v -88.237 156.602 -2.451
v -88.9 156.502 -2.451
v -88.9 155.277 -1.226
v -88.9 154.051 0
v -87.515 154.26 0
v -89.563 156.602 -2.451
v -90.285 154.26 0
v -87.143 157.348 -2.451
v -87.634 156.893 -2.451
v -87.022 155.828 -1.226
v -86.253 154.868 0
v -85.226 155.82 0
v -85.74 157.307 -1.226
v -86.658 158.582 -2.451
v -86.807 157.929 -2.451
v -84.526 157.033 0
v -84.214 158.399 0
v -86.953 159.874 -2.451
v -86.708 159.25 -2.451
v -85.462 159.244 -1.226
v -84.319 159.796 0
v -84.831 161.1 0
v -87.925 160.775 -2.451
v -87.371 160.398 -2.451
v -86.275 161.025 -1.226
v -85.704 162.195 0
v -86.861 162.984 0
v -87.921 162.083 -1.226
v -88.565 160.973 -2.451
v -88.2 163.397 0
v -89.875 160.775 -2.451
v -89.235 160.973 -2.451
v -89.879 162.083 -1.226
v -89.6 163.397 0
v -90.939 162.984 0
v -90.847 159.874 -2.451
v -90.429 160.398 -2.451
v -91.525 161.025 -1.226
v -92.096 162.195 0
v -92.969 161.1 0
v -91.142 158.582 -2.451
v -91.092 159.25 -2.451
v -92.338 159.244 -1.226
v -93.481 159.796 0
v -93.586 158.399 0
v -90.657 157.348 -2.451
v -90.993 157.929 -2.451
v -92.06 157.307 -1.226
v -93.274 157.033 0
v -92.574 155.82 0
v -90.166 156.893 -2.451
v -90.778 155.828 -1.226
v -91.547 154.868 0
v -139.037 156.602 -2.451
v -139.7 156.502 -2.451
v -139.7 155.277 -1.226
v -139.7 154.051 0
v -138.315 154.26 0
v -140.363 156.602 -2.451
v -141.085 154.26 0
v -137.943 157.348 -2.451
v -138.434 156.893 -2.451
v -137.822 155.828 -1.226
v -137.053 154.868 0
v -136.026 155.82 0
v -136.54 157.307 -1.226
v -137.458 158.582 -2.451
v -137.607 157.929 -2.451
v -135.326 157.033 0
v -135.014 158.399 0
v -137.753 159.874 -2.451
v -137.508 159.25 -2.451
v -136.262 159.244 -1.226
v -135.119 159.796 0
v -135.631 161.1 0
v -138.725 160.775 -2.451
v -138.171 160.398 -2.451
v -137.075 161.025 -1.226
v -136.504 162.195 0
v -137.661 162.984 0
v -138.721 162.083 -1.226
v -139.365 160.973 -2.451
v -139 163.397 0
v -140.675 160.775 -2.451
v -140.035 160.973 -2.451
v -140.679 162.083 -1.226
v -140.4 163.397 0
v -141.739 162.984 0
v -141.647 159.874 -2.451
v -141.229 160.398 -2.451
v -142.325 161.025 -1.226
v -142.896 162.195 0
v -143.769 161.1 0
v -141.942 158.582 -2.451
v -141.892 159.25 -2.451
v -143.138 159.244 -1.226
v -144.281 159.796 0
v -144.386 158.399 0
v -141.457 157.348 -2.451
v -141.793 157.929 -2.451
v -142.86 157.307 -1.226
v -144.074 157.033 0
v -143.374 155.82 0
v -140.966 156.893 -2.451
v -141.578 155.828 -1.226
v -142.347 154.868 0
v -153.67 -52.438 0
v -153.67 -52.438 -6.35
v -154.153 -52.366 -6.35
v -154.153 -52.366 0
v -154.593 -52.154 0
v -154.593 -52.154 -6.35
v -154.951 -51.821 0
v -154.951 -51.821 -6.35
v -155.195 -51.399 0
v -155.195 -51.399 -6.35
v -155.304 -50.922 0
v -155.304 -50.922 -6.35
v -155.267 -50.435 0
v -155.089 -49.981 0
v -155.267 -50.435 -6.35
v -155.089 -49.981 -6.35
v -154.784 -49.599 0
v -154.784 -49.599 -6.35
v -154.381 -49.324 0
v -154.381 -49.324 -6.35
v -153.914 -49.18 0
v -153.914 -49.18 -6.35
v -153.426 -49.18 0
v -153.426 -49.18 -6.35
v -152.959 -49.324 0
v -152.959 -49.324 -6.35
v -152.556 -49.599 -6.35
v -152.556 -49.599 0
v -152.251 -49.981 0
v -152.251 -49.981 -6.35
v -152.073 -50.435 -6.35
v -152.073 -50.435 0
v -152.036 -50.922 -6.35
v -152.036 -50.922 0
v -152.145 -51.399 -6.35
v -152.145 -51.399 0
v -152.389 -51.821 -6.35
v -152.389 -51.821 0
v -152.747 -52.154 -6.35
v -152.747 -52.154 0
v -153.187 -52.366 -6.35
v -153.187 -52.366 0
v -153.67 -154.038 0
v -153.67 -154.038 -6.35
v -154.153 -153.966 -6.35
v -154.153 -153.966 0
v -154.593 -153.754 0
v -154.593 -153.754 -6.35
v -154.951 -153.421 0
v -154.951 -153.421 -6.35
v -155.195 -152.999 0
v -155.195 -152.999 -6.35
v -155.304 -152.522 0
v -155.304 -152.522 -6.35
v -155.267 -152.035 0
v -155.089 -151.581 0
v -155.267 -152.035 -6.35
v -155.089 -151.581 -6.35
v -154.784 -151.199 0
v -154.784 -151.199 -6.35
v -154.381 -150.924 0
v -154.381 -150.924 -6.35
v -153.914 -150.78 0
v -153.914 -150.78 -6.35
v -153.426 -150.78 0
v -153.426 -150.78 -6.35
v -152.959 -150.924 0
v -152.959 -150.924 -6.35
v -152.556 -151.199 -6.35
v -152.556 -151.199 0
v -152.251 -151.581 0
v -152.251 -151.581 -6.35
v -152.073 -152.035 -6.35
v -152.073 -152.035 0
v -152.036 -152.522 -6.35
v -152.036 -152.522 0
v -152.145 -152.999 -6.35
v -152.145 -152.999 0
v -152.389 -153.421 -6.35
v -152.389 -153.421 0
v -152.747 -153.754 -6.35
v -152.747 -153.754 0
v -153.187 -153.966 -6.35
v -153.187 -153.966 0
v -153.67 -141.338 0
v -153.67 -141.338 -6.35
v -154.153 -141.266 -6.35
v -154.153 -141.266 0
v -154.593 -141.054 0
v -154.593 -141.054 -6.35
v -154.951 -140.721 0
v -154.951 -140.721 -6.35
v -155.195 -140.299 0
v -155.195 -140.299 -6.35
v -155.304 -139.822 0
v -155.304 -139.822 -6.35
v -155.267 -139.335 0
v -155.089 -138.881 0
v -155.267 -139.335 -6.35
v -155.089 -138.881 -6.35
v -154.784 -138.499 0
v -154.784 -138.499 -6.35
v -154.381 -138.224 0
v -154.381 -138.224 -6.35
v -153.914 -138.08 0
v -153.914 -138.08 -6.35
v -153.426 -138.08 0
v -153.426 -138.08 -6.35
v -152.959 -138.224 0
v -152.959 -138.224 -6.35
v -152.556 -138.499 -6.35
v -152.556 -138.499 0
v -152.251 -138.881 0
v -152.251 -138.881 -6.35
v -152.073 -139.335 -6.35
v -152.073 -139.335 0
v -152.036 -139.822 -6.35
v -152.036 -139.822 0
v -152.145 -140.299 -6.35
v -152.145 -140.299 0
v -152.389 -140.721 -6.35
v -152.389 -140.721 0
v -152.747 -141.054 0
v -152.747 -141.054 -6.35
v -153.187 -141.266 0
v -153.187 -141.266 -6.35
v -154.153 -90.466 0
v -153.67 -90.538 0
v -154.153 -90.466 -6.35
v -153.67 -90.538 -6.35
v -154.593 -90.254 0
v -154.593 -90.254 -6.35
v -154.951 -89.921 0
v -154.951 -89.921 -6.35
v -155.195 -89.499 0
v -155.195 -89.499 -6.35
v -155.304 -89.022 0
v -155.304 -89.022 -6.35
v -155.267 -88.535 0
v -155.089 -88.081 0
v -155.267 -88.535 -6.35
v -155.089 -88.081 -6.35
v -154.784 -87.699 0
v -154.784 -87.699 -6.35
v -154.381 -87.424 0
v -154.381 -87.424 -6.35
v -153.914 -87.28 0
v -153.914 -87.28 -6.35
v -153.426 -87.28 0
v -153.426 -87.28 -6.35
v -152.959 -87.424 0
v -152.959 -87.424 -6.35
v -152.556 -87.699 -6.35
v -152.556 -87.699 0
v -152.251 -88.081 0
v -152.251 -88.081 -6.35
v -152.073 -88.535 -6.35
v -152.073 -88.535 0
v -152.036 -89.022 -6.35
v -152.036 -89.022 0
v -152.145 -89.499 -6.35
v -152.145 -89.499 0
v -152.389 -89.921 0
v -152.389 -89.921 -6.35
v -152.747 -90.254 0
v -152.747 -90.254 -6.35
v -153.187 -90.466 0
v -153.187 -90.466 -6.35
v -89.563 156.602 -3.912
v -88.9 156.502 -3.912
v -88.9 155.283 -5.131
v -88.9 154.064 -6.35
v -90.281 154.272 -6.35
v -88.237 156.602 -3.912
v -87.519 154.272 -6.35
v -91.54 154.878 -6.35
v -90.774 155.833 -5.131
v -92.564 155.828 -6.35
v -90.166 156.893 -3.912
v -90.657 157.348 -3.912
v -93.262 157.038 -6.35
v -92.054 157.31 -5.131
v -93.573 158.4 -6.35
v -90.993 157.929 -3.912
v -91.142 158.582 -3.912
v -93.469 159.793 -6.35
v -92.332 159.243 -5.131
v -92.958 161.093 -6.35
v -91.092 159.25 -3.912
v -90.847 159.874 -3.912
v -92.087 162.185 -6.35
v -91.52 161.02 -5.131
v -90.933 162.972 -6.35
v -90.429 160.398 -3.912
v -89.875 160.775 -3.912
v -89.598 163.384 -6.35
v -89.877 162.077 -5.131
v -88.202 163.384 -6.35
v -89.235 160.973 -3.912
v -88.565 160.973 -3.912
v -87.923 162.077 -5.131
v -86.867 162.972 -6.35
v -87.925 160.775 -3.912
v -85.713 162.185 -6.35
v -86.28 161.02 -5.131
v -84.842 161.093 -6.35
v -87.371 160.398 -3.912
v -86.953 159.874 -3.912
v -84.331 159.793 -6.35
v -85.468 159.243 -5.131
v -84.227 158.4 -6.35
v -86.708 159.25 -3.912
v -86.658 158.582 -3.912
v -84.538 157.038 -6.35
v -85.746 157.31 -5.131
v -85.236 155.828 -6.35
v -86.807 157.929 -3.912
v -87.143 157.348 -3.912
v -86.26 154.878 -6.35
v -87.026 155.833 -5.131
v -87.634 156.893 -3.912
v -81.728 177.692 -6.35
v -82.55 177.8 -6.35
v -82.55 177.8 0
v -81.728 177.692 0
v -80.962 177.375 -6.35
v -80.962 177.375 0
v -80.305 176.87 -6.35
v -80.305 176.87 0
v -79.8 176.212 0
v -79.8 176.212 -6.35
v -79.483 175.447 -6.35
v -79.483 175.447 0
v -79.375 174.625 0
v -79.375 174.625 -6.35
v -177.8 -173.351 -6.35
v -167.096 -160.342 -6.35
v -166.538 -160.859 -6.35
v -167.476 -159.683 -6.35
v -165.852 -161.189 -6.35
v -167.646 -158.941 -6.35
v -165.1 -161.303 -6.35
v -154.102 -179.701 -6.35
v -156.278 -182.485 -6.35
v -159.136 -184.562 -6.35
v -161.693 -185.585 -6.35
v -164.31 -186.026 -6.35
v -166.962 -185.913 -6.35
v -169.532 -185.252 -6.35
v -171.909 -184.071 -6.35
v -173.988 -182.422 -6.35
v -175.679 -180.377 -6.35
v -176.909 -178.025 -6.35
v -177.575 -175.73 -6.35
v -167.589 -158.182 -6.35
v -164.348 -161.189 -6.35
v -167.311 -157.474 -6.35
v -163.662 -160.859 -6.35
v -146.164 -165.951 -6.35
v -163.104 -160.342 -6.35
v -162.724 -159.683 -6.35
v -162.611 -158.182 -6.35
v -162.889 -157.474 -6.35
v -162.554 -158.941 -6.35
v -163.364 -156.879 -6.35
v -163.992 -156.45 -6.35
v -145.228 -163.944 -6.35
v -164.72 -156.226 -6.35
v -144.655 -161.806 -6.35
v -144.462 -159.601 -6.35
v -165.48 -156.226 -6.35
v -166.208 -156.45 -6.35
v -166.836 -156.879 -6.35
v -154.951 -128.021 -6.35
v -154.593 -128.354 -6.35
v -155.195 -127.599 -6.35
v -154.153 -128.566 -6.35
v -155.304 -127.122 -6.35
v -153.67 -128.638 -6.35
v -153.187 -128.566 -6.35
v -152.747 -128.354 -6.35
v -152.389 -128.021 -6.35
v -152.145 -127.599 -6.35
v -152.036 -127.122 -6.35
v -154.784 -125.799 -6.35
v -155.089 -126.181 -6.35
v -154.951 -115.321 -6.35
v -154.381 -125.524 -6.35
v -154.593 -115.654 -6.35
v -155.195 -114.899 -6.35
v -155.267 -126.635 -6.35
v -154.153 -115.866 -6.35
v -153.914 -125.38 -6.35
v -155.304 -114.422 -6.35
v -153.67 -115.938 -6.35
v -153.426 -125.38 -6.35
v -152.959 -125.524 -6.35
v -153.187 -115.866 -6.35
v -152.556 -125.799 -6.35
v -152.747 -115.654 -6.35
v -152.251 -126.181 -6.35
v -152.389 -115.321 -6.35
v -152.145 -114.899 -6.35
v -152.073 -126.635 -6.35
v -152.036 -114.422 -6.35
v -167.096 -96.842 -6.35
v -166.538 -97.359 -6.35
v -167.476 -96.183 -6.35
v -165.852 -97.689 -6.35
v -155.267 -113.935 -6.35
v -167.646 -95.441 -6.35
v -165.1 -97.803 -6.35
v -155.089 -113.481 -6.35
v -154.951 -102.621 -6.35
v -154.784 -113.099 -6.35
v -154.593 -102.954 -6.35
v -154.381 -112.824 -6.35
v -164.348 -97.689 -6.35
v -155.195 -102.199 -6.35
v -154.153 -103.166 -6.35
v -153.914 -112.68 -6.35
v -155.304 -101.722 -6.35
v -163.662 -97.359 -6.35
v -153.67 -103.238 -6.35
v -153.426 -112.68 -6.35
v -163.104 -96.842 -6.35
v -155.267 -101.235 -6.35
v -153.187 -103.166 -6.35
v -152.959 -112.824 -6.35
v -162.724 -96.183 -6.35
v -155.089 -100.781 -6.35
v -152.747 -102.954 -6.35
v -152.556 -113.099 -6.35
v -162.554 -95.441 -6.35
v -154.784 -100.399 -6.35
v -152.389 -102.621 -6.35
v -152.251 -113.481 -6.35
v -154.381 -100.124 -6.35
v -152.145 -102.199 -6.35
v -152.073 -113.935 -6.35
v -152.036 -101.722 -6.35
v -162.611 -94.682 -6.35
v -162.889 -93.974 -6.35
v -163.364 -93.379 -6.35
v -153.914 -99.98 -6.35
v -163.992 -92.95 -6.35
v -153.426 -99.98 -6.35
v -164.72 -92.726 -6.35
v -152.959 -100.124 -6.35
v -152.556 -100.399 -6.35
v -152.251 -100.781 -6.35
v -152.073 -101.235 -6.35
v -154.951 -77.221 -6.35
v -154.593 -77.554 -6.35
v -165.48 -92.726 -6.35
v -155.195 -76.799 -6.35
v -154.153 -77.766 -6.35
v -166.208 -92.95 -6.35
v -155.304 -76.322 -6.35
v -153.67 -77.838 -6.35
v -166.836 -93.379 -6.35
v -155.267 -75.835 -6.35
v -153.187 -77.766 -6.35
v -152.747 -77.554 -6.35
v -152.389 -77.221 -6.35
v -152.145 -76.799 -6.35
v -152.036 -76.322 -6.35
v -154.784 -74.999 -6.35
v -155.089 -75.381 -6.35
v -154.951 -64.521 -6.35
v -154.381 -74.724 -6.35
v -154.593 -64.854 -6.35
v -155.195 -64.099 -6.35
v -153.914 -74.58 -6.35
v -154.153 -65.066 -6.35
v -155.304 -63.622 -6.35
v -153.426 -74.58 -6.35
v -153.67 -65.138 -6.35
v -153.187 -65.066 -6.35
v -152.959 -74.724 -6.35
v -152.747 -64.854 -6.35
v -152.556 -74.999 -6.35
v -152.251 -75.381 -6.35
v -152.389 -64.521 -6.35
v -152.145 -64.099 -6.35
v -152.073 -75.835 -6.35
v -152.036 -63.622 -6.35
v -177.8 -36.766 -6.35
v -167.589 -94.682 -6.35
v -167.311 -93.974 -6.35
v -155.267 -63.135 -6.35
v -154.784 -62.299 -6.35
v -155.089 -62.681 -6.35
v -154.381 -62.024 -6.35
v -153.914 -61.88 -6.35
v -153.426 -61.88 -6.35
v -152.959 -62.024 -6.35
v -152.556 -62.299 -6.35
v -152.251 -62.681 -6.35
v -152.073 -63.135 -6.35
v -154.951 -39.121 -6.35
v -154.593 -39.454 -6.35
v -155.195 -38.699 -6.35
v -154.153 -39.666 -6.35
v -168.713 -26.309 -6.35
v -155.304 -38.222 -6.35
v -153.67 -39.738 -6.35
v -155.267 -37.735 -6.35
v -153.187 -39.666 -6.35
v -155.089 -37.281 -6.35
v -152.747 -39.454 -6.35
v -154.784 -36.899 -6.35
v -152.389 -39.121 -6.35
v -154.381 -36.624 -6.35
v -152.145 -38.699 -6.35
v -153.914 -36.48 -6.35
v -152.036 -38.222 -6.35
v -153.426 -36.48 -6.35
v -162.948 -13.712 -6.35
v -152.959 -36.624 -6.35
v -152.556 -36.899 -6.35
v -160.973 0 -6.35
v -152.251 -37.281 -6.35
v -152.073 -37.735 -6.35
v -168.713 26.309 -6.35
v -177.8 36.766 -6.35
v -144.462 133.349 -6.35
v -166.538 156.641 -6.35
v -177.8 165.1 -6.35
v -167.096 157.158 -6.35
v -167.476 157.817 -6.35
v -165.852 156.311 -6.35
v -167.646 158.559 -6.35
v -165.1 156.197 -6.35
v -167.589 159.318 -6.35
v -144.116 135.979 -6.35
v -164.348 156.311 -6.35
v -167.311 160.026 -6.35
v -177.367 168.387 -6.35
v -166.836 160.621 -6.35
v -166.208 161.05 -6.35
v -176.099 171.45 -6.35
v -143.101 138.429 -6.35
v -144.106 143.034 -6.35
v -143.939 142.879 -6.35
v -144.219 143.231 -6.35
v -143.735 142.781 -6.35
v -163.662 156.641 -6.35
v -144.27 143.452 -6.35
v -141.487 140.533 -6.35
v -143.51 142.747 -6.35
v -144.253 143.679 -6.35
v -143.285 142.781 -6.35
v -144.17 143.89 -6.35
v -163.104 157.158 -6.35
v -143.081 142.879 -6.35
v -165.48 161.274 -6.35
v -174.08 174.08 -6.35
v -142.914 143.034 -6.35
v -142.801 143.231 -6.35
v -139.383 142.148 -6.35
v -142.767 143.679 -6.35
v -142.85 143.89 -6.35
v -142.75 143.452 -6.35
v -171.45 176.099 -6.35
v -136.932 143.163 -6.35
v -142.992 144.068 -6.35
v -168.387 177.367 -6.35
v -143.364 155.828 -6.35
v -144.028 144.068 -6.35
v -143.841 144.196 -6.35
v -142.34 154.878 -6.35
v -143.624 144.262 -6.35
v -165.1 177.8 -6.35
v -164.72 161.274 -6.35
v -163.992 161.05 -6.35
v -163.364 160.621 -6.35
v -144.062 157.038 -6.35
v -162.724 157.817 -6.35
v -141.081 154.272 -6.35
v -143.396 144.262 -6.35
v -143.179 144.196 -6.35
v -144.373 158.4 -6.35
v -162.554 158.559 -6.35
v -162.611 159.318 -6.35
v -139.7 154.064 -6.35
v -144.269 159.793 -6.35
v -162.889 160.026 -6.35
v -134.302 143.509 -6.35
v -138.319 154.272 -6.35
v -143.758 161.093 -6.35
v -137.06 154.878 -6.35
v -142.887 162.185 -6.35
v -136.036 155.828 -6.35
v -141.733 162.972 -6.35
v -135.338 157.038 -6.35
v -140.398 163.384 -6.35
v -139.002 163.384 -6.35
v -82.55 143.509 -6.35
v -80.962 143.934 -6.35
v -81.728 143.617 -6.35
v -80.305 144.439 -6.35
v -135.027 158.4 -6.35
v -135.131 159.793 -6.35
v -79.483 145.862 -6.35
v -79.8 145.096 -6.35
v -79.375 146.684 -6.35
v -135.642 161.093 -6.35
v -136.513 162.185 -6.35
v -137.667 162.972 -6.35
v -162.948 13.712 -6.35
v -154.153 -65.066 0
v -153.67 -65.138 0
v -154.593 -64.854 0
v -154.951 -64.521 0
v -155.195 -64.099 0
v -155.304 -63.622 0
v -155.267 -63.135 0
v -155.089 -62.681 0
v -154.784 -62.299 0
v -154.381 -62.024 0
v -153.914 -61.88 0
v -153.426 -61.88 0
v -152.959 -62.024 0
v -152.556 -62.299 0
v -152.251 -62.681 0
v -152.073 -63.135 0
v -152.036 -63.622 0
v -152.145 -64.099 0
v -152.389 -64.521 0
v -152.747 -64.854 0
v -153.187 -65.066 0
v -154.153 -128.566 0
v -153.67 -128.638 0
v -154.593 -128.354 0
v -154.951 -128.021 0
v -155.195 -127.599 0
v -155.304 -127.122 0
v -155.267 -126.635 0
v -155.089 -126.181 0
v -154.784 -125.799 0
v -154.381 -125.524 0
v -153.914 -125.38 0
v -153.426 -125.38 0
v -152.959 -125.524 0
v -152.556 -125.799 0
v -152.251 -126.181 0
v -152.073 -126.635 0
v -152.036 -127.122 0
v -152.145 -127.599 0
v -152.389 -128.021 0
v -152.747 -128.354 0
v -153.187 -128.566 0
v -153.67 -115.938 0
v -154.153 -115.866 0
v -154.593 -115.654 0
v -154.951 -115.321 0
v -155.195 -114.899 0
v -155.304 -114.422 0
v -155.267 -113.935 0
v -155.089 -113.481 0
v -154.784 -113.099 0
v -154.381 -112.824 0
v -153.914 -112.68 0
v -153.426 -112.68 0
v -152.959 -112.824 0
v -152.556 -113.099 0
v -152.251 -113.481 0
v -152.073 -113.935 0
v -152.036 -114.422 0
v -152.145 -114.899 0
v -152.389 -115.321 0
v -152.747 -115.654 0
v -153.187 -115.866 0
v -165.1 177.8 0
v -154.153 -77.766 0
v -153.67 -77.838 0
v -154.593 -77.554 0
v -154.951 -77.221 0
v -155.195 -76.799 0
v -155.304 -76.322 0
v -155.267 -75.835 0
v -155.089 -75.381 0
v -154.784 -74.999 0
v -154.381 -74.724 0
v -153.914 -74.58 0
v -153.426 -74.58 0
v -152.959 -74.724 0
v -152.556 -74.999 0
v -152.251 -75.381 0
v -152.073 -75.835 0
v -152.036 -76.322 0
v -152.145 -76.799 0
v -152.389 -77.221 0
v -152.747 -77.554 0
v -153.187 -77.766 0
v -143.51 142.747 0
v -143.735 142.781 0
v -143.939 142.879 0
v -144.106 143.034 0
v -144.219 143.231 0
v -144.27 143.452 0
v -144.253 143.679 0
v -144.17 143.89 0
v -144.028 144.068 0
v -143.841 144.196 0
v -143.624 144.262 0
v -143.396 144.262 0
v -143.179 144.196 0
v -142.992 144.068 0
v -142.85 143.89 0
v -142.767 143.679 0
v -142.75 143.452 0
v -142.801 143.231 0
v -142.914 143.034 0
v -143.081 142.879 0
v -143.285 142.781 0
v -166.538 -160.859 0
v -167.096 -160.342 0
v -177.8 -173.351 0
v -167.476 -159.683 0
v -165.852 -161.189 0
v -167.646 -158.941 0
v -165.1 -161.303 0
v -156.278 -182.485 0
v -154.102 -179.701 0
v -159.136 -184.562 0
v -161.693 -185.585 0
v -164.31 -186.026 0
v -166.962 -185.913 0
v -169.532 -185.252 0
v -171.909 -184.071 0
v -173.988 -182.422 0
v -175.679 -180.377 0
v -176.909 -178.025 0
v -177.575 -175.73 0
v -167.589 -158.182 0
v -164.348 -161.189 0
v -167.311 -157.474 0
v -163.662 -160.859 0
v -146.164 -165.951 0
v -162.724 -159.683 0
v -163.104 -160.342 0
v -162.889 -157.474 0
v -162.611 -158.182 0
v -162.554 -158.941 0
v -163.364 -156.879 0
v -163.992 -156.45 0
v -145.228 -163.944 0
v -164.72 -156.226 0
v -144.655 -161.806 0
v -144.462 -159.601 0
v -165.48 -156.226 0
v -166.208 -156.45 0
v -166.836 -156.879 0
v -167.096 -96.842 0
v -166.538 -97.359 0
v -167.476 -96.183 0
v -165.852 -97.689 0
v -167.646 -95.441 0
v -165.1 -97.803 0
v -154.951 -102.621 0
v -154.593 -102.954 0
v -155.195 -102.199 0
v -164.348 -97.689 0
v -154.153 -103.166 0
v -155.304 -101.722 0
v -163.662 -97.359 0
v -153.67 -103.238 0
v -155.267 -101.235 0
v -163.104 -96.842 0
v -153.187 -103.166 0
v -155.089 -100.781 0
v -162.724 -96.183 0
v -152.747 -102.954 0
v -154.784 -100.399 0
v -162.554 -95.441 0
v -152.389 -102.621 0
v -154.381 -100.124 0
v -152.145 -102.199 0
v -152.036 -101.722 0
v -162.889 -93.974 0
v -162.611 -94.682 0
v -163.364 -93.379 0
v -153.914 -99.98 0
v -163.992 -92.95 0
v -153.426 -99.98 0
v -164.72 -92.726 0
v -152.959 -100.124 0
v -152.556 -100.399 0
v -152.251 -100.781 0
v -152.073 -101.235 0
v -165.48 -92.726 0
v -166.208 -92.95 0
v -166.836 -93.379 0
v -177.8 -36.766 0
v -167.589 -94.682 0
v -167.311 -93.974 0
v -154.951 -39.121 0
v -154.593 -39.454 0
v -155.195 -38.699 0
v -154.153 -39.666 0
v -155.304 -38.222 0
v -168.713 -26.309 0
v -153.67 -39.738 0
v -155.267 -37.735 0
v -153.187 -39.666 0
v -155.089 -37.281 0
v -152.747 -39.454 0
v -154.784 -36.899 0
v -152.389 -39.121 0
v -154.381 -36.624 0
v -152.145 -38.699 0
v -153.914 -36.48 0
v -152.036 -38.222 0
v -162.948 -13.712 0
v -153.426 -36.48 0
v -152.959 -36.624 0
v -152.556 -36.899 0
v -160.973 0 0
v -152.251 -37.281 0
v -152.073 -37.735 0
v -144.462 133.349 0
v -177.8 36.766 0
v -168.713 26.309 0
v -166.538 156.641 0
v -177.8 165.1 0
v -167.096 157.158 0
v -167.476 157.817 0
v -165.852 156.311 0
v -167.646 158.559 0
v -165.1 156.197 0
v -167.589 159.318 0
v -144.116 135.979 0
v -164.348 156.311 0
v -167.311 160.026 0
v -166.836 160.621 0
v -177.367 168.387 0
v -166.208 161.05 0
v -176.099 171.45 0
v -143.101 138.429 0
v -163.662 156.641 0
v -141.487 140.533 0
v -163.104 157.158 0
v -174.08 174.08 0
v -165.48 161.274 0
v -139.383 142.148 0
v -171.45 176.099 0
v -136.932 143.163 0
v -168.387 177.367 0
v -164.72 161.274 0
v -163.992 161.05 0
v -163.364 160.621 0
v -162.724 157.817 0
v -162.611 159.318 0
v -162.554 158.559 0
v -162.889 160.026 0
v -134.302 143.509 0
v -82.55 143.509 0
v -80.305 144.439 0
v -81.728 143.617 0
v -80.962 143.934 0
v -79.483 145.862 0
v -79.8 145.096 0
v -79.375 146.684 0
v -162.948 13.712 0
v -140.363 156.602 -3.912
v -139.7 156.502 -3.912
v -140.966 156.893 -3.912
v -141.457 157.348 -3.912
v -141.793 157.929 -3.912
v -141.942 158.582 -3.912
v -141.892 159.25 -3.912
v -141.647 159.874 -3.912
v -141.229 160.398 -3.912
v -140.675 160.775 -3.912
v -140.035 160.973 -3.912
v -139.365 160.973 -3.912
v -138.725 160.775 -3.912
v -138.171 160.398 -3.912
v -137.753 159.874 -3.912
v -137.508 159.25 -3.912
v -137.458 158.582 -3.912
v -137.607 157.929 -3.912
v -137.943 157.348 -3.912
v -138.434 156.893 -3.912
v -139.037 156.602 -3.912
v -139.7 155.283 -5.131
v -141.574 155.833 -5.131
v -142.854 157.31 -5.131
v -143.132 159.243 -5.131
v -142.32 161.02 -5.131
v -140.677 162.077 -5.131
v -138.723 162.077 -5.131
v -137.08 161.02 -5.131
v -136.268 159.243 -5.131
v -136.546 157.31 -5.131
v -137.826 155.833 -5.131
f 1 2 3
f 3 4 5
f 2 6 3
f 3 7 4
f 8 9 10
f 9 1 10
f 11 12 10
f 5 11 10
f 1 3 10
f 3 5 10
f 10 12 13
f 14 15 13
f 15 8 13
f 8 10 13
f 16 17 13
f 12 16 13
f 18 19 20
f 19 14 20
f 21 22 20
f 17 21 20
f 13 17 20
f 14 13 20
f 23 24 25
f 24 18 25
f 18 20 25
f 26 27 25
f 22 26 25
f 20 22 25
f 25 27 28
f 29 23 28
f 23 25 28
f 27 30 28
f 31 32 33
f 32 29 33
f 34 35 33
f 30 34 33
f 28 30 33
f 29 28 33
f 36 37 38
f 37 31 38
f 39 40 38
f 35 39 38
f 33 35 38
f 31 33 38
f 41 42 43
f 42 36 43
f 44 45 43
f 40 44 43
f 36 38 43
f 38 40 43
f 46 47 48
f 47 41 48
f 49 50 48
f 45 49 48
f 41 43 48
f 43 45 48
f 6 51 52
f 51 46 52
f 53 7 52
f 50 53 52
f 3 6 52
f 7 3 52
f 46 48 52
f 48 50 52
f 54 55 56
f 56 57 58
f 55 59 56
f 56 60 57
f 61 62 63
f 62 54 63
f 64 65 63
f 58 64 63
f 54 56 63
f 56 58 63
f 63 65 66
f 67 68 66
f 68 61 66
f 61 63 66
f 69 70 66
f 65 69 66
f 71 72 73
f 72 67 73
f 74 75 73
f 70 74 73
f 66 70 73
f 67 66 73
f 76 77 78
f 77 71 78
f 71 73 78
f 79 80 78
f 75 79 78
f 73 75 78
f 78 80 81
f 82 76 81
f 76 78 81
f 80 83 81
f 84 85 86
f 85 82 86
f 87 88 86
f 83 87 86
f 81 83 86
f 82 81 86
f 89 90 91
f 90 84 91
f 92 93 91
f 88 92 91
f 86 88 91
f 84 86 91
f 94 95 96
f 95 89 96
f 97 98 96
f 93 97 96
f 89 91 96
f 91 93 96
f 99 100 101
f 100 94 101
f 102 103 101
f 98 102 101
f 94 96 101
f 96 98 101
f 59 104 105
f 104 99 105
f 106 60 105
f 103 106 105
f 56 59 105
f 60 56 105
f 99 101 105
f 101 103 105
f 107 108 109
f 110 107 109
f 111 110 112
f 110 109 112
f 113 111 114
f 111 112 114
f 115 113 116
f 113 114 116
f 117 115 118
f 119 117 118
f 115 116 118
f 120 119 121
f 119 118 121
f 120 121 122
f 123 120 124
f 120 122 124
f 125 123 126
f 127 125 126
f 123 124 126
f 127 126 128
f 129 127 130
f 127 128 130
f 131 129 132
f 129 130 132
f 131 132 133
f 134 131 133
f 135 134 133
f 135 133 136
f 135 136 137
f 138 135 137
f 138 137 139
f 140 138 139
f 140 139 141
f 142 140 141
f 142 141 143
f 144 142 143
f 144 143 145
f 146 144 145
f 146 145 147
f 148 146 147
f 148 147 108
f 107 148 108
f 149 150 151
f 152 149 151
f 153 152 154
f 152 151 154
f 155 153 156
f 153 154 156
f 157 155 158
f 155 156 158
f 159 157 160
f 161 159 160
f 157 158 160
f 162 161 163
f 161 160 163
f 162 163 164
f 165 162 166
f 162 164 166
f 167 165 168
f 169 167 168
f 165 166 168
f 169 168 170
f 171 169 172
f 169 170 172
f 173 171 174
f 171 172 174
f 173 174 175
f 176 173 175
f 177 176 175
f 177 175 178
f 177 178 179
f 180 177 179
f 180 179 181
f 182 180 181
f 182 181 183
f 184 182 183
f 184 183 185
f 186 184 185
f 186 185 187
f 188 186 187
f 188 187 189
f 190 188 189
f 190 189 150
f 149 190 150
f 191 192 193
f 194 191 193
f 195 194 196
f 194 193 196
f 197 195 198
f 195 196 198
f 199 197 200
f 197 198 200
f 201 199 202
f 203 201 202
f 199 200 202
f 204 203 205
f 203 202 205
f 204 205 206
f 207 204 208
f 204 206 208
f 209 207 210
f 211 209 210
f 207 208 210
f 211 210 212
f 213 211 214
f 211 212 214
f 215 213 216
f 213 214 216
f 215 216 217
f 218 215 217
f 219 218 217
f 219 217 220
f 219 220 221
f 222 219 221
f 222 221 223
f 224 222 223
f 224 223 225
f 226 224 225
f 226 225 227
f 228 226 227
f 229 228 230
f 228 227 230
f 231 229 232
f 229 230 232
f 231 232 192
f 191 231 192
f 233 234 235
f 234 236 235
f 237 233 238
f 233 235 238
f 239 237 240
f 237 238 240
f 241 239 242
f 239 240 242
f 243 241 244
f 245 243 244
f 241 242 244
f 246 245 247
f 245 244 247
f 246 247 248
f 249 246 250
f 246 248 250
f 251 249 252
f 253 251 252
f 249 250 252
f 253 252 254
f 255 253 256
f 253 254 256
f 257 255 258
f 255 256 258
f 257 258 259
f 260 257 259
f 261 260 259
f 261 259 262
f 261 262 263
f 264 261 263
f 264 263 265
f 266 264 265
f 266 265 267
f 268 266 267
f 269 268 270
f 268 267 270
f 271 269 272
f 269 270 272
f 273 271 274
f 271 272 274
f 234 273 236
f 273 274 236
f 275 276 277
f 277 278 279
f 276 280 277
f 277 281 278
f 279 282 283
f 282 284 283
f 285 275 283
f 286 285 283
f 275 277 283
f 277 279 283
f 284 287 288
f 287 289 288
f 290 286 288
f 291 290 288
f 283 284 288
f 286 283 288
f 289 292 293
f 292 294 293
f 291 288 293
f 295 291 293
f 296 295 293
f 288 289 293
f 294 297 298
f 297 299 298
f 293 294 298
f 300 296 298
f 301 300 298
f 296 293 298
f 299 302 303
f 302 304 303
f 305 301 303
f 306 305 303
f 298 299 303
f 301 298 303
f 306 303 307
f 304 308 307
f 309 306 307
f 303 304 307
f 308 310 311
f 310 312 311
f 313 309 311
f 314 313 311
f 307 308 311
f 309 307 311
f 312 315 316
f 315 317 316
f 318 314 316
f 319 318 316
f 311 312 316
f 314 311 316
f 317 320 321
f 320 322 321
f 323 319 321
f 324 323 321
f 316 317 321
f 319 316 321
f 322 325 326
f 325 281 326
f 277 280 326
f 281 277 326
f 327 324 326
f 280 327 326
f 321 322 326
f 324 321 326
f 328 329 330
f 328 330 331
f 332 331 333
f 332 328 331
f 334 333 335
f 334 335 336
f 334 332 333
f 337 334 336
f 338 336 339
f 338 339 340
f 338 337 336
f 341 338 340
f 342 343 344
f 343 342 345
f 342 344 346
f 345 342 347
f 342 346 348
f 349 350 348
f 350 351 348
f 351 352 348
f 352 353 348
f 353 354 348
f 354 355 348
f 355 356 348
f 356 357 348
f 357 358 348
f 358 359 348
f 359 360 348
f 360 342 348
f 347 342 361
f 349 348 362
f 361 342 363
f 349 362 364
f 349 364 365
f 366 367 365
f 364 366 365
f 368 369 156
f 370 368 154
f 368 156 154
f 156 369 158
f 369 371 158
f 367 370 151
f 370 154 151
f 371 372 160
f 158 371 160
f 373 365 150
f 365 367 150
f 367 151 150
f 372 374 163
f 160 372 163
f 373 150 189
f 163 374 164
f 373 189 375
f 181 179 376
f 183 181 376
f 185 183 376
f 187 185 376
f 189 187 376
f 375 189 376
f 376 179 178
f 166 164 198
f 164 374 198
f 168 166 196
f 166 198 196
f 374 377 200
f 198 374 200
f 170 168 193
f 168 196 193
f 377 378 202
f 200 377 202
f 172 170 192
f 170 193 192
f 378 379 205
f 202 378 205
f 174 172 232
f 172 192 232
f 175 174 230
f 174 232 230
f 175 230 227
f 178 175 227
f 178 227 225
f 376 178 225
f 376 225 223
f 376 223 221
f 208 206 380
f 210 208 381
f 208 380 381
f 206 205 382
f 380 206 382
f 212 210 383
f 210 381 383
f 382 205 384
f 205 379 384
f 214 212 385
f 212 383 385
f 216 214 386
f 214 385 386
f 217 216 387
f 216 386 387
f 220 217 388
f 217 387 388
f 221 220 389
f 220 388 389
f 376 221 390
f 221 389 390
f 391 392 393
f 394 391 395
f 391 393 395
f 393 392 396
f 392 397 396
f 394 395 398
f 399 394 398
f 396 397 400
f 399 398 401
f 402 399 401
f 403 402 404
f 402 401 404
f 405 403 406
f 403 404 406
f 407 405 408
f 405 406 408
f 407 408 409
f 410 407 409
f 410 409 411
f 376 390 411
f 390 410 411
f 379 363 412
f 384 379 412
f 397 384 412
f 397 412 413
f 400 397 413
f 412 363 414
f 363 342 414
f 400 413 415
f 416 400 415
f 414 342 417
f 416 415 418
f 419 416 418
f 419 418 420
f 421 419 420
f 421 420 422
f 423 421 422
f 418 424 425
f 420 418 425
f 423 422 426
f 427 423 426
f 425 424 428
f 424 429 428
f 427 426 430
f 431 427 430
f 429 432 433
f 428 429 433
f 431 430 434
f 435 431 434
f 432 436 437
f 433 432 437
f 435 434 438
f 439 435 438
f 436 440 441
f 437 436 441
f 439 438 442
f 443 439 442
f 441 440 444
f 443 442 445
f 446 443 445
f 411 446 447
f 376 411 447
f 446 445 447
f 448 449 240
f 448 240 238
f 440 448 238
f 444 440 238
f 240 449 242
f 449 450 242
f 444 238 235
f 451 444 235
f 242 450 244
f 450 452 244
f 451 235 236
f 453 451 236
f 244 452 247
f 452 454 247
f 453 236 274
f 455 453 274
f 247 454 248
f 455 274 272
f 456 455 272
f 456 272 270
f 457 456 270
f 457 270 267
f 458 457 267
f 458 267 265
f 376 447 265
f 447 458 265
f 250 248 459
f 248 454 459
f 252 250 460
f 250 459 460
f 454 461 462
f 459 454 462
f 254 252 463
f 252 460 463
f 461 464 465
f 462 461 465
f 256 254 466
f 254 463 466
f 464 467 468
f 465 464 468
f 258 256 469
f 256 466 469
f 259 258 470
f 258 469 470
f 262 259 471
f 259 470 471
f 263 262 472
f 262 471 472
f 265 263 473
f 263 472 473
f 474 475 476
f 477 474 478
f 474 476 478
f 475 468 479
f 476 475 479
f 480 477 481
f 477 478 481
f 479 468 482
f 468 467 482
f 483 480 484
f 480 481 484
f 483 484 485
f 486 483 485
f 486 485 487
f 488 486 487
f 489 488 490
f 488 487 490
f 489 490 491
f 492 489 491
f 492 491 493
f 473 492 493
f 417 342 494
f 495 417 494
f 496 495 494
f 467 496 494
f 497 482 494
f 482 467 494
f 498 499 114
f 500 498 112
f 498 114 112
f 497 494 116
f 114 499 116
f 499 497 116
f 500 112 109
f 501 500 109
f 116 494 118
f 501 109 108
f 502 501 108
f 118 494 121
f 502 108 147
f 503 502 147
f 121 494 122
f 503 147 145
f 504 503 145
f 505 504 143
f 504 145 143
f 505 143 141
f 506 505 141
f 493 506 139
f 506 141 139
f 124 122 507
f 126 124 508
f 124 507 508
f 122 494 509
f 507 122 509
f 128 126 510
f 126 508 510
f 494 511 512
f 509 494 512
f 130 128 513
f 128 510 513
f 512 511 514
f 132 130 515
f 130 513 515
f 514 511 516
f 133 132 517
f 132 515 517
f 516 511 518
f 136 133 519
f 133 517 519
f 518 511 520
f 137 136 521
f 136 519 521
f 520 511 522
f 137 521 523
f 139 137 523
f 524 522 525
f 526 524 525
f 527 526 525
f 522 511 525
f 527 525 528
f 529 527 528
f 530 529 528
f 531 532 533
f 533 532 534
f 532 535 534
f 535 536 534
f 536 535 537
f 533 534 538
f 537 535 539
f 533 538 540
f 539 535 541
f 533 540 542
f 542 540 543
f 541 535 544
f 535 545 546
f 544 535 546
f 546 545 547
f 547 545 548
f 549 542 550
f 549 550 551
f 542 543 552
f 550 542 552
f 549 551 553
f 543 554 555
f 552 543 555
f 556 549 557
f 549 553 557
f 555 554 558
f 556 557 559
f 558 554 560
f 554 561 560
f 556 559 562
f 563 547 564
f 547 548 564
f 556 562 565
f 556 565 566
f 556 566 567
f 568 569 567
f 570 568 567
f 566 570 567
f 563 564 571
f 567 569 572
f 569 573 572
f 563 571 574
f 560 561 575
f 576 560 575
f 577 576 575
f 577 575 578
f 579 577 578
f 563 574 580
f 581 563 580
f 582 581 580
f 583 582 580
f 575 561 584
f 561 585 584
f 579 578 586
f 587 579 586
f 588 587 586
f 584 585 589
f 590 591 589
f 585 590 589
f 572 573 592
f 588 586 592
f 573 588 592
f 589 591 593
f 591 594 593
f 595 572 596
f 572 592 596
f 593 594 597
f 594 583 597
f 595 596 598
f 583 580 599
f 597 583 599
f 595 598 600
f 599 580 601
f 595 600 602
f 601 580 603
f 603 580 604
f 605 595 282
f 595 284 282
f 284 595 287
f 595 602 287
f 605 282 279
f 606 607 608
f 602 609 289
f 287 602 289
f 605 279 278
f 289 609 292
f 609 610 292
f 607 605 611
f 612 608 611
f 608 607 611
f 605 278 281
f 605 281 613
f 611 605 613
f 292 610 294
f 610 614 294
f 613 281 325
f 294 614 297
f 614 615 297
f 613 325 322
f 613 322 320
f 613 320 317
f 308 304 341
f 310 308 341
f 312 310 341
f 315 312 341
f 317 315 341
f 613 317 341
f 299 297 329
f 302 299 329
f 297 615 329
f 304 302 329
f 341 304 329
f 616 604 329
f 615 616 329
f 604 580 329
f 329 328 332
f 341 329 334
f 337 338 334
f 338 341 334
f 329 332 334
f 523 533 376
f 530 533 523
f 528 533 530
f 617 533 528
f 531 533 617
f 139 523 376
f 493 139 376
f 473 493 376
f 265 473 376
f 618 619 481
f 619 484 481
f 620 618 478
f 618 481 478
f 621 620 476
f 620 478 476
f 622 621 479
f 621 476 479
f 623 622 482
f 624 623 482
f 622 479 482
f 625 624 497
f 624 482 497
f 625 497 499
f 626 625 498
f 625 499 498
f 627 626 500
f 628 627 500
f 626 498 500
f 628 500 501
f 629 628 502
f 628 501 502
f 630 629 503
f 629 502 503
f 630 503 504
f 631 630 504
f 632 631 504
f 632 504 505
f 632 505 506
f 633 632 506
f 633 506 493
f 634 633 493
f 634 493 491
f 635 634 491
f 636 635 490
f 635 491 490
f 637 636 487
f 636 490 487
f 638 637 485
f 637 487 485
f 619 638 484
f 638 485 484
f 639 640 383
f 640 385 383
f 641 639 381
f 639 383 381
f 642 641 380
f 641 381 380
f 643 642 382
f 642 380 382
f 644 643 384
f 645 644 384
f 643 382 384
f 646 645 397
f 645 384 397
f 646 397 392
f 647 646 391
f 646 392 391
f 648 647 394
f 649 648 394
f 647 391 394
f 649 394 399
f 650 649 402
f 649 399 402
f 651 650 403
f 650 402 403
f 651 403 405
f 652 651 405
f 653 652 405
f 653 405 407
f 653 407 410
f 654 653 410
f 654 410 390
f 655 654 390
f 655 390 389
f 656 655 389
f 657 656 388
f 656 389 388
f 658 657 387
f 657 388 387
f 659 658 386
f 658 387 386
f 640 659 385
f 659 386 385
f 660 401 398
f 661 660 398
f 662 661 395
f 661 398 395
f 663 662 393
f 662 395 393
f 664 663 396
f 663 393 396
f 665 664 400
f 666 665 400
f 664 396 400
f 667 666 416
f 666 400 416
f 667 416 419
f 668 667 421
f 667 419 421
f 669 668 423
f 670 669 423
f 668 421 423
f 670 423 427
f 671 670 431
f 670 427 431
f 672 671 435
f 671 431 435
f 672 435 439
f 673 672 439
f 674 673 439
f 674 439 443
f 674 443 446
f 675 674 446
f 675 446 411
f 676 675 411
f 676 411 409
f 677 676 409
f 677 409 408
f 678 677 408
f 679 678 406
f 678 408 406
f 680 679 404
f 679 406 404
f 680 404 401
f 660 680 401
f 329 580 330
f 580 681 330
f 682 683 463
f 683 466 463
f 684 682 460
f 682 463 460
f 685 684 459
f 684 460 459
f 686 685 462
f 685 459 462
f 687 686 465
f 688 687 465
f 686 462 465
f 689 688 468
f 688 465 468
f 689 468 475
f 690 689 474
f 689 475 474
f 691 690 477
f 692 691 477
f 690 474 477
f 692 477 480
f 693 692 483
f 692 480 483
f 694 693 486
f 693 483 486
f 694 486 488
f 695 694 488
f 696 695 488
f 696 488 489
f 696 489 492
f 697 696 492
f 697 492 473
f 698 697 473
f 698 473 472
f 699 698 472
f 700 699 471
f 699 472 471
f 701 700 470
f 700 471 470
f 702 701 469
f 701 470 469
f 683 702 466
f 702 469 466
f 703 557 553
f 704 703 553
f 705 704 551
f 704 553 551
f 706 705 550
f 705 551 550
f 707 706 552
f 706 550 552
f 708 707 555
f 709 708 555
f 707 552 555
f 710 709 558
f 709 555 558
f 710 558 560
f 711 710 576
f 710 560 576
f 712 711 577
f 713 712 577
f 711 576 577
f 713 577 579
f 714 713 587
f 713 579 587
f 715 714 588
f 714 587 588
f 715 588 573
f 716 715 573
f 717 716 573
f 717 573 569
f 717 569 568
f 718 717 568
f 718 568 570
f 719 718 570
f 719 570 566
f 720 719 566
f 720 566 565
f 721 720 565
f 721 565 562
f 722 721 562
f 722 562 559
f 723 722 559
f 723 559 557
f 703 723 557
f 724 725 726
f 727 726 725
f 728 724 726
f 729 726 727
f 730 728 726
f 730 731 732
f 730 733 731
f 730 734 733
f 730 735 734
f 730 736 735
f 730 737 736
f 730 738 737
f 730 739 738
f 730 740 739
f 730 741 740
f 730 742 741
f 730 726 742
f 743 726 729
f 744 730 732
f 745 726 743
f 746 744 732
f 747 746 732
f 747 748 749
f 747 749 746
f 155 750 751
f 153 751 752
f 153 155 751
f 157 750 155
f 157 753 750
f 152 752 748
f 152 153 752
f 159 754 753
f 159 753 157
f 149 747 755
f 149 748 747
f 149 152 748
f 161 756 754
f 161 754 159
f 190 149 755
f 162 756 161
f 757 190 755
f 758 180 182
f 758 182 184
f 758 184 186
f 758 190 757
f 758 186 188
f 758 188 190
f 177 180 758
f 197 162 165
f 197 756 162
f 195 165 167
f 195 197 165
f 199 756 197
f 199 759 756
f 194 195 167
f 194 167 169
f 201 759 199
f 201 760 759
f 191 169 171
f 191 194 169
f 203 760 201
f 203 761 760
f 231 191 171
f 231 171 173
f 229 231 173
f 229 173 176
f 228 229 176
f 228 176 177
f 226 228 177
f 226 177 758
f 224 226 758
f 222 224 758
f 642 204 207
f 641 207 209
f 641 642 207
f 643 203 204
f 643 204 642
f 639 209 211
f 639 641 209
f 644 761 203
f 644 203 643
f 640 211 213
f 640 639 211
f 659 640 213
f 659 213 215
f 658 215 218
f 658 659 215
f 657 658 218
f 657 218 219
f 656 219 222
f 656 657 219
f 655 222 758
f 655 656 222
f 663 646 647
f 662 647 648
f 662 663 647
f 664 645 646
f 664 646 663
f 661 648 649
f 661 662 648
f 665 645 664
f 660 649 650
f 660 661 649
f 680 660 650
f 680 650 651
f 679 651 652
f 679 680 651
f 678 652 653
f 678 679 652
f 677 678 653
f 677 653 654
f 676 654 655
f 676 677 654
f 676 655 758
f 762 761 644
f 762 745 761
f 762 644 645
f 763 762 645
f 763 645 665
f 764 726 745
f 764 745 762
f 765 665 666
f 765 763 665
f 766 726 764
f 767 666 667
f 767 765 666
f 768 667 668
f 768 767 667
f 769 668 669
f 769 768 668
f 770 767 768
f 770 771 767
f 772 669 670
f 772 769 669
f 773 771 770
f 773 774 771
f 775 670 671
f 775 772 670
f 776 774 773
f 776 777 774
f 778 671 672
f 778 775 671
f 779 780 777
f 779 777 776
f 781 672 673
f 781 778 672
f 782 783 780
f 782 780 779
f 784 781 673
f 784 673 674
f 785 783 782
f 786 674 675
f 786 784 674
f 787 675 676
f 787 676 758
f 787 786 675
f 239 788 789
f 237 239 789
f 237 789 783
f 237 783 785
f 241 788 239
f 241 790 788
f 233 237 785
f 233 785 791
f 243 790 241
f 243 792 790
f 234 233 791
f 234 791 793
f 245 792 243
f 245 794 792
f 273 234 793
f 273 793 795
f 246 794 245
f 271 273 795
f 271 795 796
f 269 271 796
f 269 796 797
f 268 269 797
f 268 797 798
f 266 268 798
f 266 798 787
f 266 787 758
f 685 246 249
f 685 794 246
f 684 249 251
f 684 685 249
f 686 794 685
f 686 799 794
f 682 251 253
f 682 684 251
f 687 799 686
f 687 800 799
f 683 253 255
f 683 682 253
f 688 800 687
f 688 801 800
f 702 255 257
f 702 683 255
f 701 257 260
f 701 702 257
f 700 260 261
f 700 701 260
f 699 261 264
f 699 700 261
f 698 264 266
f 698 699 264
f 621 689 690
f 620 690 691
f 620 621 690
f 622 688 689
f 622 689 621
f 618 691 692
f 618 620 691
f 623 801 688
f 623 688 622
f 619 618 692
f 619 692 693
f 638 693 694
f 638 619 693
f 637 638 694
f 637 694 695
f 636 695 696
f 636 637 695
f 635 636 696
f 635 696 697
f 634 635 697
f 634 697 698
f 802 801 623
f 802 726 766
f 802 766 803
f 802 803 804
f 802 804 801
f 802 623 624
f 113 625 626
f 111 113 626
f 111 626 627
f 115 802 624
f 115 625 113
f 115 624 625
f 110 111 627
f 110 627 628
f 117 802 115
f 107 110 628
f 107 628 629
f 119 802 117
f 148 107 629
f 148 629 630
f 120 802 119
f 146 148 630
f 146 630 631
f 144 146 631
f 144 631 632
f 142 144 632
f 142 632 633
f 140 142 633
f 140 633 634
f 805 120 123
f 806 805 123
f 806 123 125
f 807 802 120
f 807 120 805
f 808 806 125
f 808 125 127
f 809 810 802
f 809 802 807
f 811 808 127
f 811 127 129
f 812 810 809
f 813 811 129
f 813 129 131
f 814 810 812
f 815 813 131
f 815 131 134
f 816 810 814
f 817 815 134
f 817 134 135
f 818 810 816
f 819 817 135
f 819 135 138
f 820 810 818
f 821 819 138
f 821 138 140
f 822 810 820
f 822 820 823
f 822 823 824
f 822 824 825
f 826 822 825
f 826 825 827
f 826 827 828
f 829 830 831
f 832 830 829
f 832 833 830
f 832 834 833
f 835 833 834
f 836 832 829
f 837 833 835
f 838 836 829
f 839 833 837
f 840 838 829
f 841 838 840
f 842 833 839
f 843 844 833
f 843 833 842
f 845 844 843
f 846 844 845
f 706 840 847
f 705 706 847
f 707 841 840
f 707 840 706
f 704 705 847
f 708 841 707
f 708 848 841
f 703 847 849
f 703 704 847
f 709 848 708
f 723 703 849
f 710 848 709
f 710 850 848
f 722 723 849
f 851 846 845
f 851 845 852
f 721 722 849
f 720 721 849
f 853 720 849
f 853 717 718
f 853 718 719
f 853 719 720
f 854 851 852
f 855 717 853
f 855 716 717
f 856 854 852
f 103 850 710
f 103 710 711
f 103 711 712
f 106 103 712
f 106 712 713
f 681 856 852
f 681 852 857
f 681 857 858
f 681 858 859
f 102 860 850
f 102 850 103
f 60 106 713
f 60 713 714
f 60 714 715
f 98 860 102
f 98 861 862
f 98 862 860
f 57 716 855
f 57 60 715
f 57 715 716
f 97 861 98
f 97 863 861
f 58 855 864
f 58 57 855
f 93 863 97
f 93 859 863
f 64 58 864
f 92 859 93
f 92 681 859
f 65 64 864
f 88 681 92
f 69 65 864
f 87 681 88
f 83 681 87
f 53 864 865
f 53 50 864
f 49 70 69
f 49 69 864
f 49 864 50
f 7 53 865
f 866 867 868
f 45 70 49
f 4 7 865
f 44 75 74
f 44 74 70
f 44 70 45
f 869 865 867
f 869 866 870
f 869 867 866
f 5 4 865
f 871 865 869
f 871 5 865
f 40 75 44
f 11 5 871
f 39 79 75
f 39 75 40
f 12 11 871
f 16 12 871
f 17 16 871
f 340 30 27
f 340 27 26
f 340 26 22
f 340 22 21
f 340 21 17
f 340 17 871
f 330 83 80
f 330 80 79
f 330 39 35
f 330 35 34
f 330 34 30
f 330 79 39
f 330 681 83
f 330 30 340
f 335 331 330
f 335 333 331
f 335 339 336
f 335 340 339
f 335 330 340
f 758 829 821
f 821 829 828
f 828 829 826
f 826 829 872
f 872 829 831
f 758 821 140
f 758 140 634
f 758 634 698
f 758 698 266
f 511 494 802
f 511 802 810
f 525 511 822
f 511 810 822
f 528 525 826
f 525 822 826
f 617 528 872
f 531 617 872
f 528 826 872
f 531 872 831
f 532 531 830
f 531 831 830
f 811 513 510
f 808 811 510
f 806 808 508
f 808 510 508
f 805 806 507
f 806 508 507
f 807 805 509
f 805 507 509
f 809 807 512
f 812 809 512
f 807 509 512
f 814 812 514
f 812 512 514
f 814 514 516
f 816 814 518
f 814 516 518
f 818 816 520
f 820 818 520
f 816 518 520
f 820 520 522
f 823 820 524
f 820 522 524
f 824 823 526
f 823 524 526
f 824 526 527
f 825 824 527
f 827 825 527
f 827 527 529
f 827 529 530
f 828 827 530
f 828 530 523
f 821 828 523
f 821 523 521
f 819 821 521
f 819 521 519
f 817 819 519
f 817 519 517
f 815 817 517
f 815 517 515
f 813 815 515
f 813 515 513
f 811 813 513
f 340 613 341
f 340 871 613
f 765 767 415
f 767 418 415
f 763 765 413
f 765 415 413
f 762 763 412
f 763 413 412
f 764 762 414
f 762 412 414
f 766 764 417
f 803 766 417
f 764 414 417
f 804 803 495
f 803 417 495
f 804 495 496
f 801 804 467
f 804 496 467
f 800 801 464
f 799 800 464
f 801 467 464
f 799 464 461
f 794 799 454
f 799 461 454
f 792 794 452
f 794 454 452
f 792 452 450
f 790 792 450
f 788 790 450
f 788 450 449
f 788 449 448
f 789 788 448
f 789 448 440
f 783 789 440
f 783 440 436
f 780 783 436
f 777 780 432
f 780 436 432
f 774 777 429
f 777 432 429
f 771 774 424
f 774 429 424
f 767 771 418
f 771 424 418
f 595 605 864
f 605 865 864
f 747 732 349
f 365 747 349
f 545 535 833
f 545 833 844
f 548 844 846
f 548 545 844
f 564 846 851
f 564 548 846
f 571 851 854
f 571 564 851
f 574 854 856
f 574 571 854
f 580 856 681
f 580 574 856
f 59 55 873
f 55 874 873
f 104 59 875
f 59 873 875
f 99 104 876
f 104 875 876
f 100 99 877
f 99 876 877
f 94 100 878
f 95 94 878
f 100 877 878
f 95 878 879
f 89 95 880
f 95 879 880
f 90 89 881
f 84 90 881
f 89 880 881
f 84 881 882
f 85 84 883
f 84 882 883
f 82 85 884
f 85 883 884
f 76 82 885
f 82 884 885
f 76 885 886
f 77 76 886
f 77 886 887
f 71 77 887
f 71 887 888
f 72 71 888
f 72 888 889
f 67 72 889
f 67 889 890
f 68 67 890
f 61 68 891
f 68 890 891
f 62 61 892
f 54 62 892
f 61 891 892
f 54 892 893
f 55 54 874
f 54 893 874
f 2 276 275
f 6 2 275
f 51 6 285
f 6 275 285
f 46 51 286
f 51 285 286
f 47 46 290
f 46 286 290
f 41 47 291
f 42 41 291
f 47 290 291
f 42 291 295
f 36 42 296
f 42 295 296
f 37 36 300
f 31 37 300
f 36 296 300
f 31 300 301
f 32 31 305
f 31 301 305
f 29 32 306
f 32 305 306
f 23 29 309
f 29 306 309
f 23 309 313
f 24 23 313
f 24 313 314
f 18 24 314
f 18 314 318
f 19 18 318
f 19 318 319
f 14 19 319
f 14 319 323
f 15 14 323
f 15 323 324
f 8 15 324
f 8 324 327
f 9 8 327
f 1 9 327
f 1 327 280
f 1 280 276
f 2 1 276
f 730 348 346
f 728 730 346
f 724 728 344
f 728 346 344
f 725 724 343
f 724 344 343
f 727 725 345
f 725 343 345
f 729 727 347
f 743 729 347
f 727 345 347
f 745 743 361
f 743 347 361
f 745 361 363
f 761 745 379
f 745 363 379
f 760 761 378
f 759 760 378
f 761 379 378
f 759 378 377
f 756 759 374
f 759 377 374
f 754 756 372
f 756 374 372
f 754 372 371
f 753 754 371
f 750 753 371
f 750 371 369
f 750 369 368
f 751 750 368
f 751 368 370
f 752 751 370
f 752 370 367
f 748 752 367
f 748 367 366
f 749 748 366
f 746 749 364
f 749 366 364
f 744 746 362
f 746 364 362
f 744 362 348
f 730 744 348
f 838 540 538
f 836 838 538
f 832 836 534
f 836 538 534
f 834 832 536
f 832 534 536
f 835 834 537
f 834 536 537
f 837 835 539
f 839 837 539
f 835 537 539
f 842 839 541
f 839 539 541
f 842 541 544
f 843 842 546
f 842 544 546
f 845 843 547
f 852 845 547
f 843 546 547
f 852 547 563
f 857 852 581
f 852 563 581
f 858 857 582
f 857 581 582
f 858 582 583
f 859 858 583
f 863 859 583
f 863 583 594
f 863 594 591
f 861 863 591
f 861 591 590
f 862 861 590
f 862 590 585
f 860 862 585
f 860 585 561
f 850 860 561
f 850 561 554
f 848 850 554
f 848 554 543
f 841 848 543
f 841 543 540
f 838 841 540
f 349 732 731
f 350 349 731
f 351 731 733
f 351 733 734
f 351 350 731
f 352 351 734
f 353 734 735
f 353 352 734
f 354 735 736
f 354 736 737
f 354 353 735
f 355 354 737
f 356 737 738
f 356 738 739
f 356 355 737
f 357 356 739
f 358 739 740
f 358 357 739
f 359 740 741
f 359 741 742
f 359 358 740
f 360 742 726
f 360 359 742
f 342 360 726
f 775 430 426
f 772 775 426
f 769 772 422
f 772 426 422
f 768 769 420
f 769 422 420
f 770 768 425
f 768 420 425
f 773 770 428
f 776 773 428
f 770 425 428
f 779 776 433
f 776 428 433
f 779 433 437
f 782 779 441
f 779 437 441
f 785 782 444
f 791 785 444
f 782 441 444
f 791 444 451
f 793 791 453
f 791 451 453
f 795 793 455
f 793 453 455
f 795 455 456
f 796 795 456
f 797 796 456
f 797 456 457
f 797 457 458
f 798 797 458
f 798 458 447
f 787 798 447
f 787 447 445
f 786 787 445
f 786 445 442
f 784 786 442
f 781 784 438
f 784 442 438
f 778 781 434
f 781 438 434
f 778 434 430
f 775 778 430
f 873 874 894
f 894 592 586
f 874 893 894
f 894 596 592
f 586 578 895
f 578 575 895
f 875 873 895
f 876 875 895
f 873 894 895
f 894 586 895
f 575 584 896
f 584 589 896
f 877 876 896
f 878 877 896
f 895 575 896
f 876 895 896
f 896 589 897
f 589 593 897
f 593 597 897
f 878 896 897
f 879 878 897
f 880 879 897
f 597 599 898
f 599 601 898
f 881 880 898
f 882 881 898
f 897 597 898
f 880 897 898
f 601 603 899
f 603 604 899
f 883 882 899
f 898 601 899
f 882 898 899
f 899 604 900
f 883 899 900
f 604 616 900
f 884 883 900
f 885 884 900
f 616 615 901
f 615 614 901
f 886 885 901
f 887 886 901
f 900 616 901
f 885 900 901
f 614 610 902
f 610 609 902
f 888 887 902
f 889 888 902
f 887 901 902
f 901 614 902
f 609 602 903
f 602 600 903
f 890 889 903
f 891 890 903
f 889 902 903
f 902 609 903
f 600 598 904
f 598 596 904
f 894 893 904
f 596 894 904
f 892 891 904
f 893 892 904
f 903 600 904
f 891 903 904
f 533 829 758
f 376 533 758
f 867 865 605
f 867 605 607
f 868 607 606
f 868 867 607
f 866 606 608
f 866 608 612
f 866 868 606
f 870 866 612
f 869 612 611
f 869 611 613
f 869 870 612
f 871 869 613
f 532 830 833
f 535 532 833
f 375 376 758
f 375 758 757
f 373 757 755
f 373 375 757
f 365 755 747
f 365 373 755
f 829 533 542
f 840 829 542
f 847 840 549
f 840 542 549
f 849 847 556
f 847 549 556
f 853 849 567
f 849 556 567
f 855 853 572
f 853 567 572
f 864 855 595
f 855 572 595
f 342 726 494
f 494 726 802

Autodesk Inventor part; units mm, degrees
ref_plane "YZ Plane" through (0, 0, 0) normal (1, 0, 0) x (0, 1, 0)
ref_plane "XZ Plane" through (0, 0, 0) normal (0, 1, 0) x (-1, 0, 0)
ref_plane "XY Plane" through (0, 0, 0) normal (0, 0, 1) x (1, 0, 0)
sketch "Sketch1" plane through (0, 0, 0) normal (0, 0, 1) x (1, 0, 0)
  line L0 (0, 251.46) -> (0, -264.16) projected
  line L1 (-361.3785, 0) -> (361.3785, 0) projected
  line L2 (177.8, -190.5) -> (-177.8, -190.5)
  line L3 (-177.8, -190.5) -> (-177.8, 177.8)
  line L4 (-177.8, 177.8) -> (177.8, 177.8)
  line L5 (177.8, 177.8) -> (177.8, -190.5)
  line L6 (143.51, -143.511) -> (-143.51, -143.511) construction
  line L7 (-143.51, -143.511) -> (-143.51, 143.509) construction
  line L8 (-143.51, 143.509) -> (143.51, 143.509) construction
  line L9 (143.51, 143.509) -> (143.51, -143.511) construction
  line L10 (-177.8, 177.8) -> (-177.8, 177.8)
  line L11 (-177.8, -190.5) -> (-177.8, 177.8)
  line L12 (177.8, 177.8) -> (177.8, 177.8)
  line L13 (177.8, -190.5) -> (177.8, 177.8)
  line L14 (-165.1, -158.75) -> (165.1, -158.75) construction
  line L15 (165.1, -158.75) -> (165.1, 158.75) construction
  line L16 (165.1, 158.75) -> (-165.1, 158.75) construction
  line L17 (-165.1, 158.75) -> (-165.1, -158.75) construction
  line L18 (144.4625, 143.509) -> (-144.4625, 143.509)
  line L19 (-144.4625, 143.509) -> (-144.4625, -190.5)
  line L20 (-144.4625, -190.5) -> (144.4625, -190.5)
  line L21 (144.4625, -190.5) -> (144.4625, 143.509)
  line L22 (144.4625, 143.509) -> (-144.4625, -190.5) construction
  line L23 (-144.4625, 143.509) -> (144.4625, -190.5) construction
  circle A0 centre (-209.55, 0) radius 48.5775
  circle A1 centre (209.55, 0) radius 48.5775
  line L24 (-65.455, 153.009) -> (-55.955, 153.009) construction
  line L25 (0, 177.8) -> (0, 143.509)
  point P0 (0, 0)
  point P1 (0, -23.4955)
  point P2 (-71.755, 153.009)
  point P3 (-139.7, 158.75)
  point P4 (139.7, 158.75)
  point P5 (0, 158.75)
  point P6 (-88.9, 158.75)
  point P7 (88.9, 158.75)
  point P8 (-165.1, -95.25)
  point P9 (165.1, -95.25)
  dimension "d2" = 355.6
  dimension "d66" = 177.8
  dimension "d70" = 368.3
  dimension "d71" = 177.8
  dimension "d85" = 287.02
  dimension "d86" = 330.2
  dimension "d94" = 288.925
  dimension "d95" = 0
  dimension "d107" = 209.55
  dimension "d108" = 97.155
  dimension "d111" = 209.55
  dimension "d112" = 9.5
  dimension "d113" = 9.5
  dimension "d115" = 15.8
  dimension "d116" = 71.755
  dimension "d124" = 139.7
  dimension "d125" = 139.7
  dimension "d133" = 317.5
  dimension "d134" = 165.1
  dimension "d135" = 158.75
  dimension "d136" = 50.8
  dimension "d137" = 50.8
  dimension "d158" = 63.5
  dimension "d159" = 63.5
  dimension "d160" = 55.955
extrude "Extrusion1" add sketch "Sketch1" against normal blind 6.35 contours L4 L5 A1 L1 L21 L18 L0 | L0 L18 L19 L1 A0 L3 L4 | L18 L21 L1 L0 | L0 L1 L19 L18 | L1 L21 L2 L0 | L0 L2 L19 L1 | A0 L1 L3 | L5 L1 A1 | L19 L2 L3 A0 L1 | L1 A1 L5 L2 L21 | L1 A0 L3 | L5 A1 L1 picked at (-175.8618, 22.522) picked at (175.8618, 22.522) picked at (-175.8618, -22.522) picked at (175.8618, -22.522)
hole "Hole5" at (-165.1, 158.75, 0) at (165.1, 158.75, 0) at (165.1, -158.75, 0) at (-165.1, -158.75, 0) at (-165.1, -95.25, 0) at (165.1, -95.25, 0) direction (0, 0, -1) diameter 5.1054 end through all clearance for "Flat Head Machine Screw (82)" size "#10" standard "Ansi Unified Screw Threads"
extrude "Extrusion5" cut sketch "Sketch1" against normal up to next contours L18 L21 L1 L0 | L0 L1 L19 L18 | L1 L21 L2 L0 | L0 L2 L19 L1
chamfer "Chamfer3" distance 15.875 angle 60 1 edges at (-144.4625, -190.5, -3.175) measured on face at (-166.6875, -190.5, -4.2333)
chamfer "Chamfer4" distance 15.875 angle 60 1 edges at (144.4625, -190.5, -3.175) measured on face at (155.575, -190.5, -4.2333)
fillet "Fillet8" radius 12.7 4 edges at (160.3375, -190.5, -3.175) (144.4625, -163.0037, -3.175) (-144.4625, -163.0037, -3.175) (-160.3375, -190.5, -3.175)
fillet "Fillet6" radius 12.7 4 edges at (177.8, -190.5, -3.175) (177.8, 177.8, -3.175) (-177.8, -190.5, -3.175) (-177.8, 177.8, -3.175)
fillet "Fillet7" radius 10.16 2 edges at (144.4625, 143.509, -3.175) (-144.4625, 143.509, -3.175)
extrude "Extrusion6" cut sketch "Sketch1" against normal up to next contours A0 L1 L3 | L3 L1 A0 | A1 L1 L5 | L5 L1 A1 | L3 A0 L1 | L1 A0 L3 | L5 A1 L1 | L1 A1 L5
hole "Hole6" at (-143.51, 143.509, 0) at (-65.455, 153.009, 0) at (-55.955, 153.009, 0) direction (0, 0, -1) diameter 1.524 end through all
mirror "Mirror1" about plane through (0, 0, 0) normal (1, 0, 0) of "Hole6"
hole "Hole7" at (-139.7, 158.75, 0) at (139.7, 158.75, 0) at (-88.9, 158.75, 0) at (88.9, 158.75, 0) direction (0, 0, -1) diameter 4.4958 end through all countersink diameter 9.398 countersink angle 90 clearance for "Flat Head Machine Screw" size "M4" standard "Ansi Metric M Profile"
sketch "Sketch3" plane through (0, 0, 0) normal (0, 0, 1) x (1, 0, 0)
  line L0 (0, 294.3121) -> (0, -274.6479) projected
  line L1 (-258.445, 0) -> (306.07, 0) projected
  line L2 (-79.375, 213.0321) -> (225.425, 213.0321)
  line L3 (225.425, 213.0321) -> (225.425, -193.3679)
  line L4 (225.425, -193.3679) -> (-79.375, -193.3679)
  line L5 (-79.375, -193.3679) -> (-79.375, 213.0321)
  line L6 (-177.8, -36.7656) -> (-177.8, -173.3489) projected
  line L7 (-144.4625, -159.6007) -> (-144.4625, 133.349) projected
  point P0 (0, 0)
  point P1 (-153.67, -152.4)
  dimension "d138" = 304.8
  dimension "d139" = 406.4
  dimension "d140" = 79.375
  dimension "d144" = 24.13
  dimension "d145" = 152.4
  dimension "d157" = 9.2075
extrude "Extrusion7" cut sketch "Sketch3" against normal up to next
fillet "Fillet9" radius 3.175 2 edges at (-79.375, 143.509, -3.175) (-79.375, 177.8, -3.175)
hole "Hole8" at (-153.67, -152.4, 0) direction (0, 0, -1) diameter 3.2766 end through all clearance for "Flat Head Machine Screw (82)" size "#4" standard "Ansi Unified Screw Threads"
pattern_linear "Rectangular Pattern3" count 10 spacing 12.7 along (0, 1, 0) of "Hole8"
chamfer "Chamfer5" distance 2.4384 angle 45 2 edges at (-139.7, 160.9979, -6.35) (-88.9, 160.9979, -6.35)
ref_plane "Work Plane1" through (0, 0, 0) normal (1, 0, 0) x (0, 1, 0)
properties material "ACETAL COPOLYMER, WHITE"
